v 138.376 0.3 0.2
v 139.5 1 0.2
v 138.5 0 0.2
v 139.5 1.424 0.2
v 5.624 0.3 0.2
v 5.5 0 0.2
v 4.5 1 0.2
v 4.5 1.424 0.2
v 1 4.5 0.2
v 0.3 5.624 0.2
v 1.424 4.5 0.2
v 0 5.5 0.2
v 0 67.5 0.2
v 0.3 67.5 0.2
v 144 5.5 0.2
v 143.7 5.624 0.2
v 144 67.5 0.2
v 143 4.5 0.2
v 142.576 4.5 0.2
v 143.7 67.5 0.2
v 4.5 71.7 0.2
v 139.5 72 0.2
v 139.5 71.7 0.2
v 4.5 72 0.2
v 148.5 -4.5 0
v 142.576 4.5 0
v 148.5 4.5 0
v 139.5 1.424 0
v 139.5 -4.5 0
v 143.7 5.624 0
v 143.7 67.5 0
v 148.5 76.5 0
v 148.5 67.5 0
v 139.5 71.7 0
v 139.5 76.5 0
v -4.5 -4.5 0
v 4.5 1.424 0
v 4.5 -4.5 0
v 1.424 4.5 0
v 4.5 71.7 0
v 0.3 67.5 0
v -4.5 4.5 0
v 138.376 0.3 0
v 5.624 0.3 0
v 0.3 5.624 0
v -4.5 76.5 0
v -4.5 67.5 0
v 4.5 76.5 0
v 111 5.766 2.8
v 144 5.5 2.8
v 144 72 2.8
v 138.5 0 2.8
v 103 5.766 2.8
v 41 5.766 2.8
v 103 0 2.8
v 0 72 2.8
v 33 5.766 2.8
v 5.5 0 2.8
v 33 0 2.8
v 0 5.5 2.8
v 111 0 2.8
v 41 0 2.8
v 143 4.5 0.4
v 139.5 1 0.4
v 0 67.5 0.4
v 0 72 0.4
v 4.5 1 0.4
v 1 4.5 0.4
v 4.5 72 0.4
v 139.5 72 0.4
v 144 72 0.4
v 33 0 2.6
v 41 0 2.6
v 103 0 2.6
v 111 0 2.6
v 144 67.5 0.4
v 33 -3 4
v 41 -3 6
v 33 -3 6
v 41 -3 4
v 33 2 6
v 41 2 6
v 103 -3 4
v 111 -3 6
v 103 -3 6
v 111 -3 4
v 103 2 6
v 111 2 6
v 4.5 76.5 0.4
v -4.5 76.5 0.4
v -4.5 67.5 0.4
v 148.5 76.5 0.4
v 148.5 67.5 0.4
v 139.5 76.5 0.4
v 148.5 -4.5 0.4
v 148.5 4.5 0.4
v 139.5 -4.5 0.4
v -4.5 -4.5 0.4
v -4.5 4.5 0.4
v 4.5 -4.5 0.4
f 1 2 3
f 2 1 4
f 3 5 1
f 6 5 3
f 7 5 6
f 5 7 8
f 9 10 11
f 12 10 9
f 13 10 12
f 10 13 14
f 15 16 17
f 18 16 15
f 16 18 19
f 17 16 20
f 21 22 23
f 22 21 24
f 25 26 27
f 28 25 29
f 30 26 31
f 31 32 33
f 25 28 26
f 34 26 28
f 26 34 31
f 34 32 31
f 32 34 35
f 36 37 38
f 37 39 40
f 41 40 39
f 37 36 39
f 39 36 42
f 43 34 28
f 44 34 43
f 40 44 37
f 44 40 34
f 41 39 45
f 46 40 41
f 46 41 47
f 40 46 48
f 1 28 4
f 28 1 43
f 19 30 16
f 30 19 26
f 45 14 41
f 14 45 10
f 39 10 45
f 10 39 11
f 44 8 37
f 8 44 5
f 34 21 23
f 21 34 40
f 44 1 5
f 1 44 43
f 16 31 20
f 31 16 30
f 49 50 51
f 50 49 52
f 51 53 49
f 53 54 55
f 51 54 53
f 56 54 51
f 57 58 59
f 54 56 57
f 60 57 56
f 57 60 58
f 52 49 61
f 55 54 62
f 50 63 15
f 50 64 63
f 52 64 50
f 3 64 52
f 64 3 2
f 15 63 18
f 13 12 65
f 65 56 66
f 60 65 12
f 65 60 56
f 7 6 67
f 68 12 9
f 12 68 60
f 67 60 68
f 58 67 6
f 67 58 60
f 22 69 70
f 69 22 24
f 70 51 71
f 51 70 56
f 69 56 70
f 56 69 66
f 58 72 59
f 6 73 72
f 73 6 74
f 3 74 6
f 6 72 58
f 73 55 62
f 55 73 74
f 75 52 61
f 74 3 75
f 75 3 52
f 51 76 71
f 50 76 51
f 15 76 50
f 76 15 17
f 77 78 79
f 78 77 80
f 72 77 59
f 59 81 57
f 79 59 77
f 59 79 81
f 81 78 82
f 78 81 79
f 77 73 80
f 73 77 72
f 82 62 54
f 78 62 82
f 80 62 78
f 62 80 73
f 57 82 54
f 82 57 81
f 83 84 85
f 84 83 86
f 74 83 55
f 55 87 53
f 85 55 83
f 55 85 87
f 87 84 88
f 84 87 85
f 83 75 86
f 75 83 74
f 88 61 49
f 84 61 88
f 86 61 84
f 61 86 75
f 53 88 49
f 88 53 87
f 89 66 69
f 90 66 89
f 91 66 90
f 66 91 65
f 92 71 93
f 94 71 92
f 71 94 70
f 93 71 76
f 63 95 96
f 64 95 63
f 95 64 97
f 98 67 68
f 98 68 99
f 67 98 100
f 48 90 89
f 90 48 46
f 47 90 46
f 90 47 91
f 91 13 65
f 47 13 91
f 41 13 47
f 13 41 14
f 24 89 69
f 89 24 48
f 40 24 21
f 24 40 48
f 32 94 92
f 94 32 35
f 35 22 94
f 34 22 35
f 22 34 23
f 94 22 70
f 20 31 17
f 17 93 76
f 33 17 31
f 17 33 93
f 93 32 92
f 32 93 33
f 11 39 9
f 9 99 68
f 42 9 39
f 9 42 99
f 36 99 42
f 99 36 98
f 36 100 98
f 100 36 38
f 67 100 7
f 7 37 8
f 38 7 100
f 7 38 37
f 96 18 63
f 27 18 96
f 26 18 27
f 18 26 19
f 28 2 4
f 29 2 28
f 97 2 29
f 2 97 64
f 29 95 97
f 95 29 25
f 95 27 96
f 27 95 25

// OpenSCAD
for (a = [true, false]) {
  translate([0, 0, a ? 0 : 0.2]) {
    linear_extrude(a ? 0.2 : 2.6) {
      offset (a ? -0.3 : 0) {
        difference() {
          square([144, 72]);
          for (x = [0, 144])
            translate([x, 0])
              rotate([0, 0, 45])
                square(5.5*sqrt(2), center=true);
        }
      }
    }
  }
}

for (x = [33, 144 - 8 - 33]) {
  translate([x, 0]) {
    hull() {
      translate([0, 0, 2.6])
        cube([8, 6, 0.001]);
      translate([0, -3, 4])
        cube([8, 5, 2]);
    }
  }
}

linear_extrude(0.4)
  for (x = [0, 144], y = [0, 72])
    translate([x, y])
      square(9, center=true);
